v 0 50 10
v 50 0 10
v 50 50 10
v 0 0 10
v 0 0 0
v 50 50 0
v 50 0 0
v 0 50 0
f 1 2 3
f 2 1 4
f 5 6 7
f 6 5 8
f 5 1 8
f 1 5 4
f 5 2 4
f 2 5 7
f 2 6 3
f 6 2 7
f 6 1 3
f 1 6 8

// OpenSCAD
// Parameters for the grid size and cube size
cube_size = 10;  // Side length of each cube
grid_size_X = 5;   // Grid dimensions (grid_size x grid_size)
grid_size_Y = 5;
Count = 10;


module generate_grid() {
    // Generate grid of cubes with alternating colors
    for (y = [0 : 1  : grid_size_Y-1 ]) {
        for(x = [ 0 : (-1^y)*-1: ((grid_size_X-1)*-1^y)*-1 ]){
    //        color_ = get_color(1/(grid_size-1), 0, 0);
    //        echo(x);
    //        echo(color_);
            echo("y",y);
            echo("x",x);
            echo("hello", (-1)^y);
            echo("Color_y",(1/(grid_size_Y-1))*y);
            echo("Color_x",(1/(grid_size_X-1))*x*(-1^y));
            translate([x * cube_size, y * cube_size, 0 * cube_size]) {
                color(c = [ ((1/(grid_size_X-1))*x*(-1^y))*-1,(1/(grid_size_Y-1))*y,0], alpha = 0.5){
                    cube(cube_size);
                }
            }
        }
    }
}
generate_grid(); // Run the grid generation
